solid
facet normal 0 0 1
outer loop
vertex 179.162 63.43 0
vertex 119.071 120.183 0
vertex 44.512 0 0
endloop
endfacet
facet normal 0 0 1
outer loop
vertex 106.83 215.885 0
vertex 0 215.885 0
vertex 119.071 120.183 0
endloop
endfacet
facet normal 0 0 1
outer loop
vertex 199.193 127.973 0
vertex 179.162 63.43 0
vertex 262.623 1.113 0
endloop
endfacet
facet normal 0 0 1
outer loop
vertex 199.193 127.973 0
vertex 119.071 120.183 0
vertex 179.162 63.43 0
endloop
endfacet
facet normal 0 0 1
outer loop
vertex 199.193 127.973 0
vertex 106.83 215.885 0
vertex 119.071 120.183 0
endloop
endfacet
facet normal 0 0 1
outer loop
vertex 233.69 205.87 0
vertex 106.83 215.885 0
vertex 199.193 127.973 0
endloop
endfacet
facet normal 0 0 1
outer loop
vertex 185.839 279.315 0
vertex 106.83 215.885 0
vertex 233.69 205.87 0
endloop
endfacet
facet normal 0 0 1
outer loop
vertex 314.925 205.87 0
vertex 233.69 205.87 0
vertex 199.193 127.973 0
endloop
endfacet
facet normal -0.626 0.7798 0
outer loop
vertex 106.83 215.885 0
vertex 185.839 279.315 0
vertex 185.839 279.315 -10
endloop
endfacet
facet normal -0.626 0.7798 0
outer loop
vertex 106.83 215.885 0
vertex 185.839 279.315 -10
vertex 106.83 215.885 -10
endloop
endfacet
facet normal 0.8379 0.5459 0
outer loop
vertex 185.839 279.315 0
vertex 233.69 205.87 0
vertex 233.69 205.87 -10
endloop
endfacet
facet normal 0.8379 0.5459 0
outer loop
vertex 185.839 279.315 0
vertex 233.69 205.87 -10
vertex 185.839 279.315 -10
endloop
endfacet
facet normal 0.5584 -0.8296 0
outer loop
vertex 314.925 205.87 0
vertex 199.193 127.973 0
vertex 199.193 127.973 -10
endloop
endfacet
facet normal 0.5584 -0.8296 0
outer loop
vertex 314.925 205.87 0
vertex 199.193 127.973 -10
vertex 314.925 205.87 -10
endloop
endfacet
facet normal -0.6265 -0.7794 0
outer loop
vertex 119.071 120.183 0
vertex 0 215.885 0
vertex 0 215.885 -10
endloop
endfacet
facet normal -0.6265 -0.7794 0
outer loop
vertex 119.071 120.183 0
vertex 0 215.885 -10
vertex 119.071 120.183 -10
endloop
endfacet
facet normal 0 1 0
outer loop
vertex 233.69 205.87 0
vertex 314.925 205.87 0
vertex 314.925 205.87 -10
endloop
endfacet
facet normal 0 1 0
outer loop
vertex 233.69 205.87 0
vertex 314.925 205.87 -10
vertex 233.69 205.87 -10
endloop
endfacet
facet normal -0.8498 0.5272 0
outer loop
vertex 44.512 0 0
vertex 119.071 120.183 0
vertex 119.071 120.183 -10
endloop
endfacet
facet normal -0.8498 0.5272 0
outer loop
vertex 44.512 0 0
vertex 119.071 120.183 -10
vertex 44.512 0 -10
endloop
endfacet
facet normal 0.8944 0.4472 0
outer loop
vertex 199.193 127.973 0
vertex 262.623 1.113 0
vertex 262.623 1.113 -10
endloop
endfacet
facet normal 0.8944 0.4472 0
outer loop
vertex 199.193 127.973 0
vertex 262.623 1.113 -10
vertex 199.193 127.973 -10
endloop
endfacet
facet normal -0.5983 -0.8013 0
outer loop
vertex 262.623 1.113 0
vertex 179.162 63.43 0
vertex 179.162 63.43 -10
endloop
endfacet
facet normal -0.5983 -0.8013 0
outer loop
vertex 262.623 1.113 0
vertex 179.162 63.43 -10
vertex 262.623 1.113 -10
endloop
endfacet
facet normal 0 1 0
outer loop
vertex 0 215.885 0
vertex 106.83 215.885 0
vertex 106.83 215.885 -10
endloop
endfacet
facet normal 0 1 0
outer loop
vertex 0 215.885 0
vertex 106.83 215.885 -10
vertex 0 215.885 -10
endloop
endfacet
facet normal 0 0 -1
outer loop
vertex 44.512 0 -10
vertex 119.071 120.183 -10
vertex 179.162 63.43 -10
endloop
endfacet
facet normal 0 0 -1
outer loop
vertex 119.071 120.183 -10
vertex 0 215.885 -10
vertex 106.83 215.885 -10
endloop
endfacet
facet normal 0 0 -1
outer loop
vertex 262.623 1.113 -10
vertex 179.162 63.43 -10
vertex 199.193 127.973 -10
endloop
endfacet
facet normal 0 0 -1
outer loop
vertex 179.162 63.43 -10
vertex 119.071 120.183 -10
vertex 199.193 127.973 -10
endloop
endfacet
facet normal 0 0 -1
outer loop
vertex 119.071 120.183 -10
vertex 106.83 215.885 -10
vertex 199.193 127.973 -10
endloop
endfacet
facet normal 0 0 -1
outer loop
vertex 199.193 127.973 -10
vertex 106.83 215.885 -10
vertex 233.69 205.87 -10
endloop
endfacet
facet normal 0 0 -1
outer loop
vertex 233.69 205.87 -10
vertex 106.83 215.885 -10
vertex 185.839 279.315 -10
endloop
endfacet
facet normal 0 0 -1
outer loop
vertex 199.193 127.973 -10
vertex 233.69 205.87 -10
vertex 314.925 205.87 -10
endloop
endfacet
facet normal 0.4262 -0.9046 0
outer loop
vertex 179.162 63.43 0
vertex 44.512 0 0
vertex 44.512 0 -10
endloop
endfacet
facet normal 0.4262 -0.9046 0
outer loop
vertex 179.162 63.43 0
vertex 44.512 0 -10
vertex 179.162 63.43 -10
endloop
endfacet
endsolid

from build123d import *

# Parameters (mm, degrees)
PAD_DEPTH = 10


with BuildPart() as part:
    # Sketch → Pad (new body)
    with BuildSketch(Plane.XY):
        Polygon((-38.693619, 95.521584), (-117.703079, 32.091431), (-224.532791, 32.091431), (-105.462189, -63.61018), (-180.020416, -183.79361), (-45.370419, -120.363464), (38.090302, -182.680801), (-25.339891, -55.820522), (90.392357, 22.076147), (9.157263, 22.076147), align=None)
    extrude(amount=-PAD_DEPTH)


with BuildPart() as part_1:
    # Body placement: moved
    add(part.part.moved(Location((224.532791, 183.79361, 0))))


solid = part_1.part
